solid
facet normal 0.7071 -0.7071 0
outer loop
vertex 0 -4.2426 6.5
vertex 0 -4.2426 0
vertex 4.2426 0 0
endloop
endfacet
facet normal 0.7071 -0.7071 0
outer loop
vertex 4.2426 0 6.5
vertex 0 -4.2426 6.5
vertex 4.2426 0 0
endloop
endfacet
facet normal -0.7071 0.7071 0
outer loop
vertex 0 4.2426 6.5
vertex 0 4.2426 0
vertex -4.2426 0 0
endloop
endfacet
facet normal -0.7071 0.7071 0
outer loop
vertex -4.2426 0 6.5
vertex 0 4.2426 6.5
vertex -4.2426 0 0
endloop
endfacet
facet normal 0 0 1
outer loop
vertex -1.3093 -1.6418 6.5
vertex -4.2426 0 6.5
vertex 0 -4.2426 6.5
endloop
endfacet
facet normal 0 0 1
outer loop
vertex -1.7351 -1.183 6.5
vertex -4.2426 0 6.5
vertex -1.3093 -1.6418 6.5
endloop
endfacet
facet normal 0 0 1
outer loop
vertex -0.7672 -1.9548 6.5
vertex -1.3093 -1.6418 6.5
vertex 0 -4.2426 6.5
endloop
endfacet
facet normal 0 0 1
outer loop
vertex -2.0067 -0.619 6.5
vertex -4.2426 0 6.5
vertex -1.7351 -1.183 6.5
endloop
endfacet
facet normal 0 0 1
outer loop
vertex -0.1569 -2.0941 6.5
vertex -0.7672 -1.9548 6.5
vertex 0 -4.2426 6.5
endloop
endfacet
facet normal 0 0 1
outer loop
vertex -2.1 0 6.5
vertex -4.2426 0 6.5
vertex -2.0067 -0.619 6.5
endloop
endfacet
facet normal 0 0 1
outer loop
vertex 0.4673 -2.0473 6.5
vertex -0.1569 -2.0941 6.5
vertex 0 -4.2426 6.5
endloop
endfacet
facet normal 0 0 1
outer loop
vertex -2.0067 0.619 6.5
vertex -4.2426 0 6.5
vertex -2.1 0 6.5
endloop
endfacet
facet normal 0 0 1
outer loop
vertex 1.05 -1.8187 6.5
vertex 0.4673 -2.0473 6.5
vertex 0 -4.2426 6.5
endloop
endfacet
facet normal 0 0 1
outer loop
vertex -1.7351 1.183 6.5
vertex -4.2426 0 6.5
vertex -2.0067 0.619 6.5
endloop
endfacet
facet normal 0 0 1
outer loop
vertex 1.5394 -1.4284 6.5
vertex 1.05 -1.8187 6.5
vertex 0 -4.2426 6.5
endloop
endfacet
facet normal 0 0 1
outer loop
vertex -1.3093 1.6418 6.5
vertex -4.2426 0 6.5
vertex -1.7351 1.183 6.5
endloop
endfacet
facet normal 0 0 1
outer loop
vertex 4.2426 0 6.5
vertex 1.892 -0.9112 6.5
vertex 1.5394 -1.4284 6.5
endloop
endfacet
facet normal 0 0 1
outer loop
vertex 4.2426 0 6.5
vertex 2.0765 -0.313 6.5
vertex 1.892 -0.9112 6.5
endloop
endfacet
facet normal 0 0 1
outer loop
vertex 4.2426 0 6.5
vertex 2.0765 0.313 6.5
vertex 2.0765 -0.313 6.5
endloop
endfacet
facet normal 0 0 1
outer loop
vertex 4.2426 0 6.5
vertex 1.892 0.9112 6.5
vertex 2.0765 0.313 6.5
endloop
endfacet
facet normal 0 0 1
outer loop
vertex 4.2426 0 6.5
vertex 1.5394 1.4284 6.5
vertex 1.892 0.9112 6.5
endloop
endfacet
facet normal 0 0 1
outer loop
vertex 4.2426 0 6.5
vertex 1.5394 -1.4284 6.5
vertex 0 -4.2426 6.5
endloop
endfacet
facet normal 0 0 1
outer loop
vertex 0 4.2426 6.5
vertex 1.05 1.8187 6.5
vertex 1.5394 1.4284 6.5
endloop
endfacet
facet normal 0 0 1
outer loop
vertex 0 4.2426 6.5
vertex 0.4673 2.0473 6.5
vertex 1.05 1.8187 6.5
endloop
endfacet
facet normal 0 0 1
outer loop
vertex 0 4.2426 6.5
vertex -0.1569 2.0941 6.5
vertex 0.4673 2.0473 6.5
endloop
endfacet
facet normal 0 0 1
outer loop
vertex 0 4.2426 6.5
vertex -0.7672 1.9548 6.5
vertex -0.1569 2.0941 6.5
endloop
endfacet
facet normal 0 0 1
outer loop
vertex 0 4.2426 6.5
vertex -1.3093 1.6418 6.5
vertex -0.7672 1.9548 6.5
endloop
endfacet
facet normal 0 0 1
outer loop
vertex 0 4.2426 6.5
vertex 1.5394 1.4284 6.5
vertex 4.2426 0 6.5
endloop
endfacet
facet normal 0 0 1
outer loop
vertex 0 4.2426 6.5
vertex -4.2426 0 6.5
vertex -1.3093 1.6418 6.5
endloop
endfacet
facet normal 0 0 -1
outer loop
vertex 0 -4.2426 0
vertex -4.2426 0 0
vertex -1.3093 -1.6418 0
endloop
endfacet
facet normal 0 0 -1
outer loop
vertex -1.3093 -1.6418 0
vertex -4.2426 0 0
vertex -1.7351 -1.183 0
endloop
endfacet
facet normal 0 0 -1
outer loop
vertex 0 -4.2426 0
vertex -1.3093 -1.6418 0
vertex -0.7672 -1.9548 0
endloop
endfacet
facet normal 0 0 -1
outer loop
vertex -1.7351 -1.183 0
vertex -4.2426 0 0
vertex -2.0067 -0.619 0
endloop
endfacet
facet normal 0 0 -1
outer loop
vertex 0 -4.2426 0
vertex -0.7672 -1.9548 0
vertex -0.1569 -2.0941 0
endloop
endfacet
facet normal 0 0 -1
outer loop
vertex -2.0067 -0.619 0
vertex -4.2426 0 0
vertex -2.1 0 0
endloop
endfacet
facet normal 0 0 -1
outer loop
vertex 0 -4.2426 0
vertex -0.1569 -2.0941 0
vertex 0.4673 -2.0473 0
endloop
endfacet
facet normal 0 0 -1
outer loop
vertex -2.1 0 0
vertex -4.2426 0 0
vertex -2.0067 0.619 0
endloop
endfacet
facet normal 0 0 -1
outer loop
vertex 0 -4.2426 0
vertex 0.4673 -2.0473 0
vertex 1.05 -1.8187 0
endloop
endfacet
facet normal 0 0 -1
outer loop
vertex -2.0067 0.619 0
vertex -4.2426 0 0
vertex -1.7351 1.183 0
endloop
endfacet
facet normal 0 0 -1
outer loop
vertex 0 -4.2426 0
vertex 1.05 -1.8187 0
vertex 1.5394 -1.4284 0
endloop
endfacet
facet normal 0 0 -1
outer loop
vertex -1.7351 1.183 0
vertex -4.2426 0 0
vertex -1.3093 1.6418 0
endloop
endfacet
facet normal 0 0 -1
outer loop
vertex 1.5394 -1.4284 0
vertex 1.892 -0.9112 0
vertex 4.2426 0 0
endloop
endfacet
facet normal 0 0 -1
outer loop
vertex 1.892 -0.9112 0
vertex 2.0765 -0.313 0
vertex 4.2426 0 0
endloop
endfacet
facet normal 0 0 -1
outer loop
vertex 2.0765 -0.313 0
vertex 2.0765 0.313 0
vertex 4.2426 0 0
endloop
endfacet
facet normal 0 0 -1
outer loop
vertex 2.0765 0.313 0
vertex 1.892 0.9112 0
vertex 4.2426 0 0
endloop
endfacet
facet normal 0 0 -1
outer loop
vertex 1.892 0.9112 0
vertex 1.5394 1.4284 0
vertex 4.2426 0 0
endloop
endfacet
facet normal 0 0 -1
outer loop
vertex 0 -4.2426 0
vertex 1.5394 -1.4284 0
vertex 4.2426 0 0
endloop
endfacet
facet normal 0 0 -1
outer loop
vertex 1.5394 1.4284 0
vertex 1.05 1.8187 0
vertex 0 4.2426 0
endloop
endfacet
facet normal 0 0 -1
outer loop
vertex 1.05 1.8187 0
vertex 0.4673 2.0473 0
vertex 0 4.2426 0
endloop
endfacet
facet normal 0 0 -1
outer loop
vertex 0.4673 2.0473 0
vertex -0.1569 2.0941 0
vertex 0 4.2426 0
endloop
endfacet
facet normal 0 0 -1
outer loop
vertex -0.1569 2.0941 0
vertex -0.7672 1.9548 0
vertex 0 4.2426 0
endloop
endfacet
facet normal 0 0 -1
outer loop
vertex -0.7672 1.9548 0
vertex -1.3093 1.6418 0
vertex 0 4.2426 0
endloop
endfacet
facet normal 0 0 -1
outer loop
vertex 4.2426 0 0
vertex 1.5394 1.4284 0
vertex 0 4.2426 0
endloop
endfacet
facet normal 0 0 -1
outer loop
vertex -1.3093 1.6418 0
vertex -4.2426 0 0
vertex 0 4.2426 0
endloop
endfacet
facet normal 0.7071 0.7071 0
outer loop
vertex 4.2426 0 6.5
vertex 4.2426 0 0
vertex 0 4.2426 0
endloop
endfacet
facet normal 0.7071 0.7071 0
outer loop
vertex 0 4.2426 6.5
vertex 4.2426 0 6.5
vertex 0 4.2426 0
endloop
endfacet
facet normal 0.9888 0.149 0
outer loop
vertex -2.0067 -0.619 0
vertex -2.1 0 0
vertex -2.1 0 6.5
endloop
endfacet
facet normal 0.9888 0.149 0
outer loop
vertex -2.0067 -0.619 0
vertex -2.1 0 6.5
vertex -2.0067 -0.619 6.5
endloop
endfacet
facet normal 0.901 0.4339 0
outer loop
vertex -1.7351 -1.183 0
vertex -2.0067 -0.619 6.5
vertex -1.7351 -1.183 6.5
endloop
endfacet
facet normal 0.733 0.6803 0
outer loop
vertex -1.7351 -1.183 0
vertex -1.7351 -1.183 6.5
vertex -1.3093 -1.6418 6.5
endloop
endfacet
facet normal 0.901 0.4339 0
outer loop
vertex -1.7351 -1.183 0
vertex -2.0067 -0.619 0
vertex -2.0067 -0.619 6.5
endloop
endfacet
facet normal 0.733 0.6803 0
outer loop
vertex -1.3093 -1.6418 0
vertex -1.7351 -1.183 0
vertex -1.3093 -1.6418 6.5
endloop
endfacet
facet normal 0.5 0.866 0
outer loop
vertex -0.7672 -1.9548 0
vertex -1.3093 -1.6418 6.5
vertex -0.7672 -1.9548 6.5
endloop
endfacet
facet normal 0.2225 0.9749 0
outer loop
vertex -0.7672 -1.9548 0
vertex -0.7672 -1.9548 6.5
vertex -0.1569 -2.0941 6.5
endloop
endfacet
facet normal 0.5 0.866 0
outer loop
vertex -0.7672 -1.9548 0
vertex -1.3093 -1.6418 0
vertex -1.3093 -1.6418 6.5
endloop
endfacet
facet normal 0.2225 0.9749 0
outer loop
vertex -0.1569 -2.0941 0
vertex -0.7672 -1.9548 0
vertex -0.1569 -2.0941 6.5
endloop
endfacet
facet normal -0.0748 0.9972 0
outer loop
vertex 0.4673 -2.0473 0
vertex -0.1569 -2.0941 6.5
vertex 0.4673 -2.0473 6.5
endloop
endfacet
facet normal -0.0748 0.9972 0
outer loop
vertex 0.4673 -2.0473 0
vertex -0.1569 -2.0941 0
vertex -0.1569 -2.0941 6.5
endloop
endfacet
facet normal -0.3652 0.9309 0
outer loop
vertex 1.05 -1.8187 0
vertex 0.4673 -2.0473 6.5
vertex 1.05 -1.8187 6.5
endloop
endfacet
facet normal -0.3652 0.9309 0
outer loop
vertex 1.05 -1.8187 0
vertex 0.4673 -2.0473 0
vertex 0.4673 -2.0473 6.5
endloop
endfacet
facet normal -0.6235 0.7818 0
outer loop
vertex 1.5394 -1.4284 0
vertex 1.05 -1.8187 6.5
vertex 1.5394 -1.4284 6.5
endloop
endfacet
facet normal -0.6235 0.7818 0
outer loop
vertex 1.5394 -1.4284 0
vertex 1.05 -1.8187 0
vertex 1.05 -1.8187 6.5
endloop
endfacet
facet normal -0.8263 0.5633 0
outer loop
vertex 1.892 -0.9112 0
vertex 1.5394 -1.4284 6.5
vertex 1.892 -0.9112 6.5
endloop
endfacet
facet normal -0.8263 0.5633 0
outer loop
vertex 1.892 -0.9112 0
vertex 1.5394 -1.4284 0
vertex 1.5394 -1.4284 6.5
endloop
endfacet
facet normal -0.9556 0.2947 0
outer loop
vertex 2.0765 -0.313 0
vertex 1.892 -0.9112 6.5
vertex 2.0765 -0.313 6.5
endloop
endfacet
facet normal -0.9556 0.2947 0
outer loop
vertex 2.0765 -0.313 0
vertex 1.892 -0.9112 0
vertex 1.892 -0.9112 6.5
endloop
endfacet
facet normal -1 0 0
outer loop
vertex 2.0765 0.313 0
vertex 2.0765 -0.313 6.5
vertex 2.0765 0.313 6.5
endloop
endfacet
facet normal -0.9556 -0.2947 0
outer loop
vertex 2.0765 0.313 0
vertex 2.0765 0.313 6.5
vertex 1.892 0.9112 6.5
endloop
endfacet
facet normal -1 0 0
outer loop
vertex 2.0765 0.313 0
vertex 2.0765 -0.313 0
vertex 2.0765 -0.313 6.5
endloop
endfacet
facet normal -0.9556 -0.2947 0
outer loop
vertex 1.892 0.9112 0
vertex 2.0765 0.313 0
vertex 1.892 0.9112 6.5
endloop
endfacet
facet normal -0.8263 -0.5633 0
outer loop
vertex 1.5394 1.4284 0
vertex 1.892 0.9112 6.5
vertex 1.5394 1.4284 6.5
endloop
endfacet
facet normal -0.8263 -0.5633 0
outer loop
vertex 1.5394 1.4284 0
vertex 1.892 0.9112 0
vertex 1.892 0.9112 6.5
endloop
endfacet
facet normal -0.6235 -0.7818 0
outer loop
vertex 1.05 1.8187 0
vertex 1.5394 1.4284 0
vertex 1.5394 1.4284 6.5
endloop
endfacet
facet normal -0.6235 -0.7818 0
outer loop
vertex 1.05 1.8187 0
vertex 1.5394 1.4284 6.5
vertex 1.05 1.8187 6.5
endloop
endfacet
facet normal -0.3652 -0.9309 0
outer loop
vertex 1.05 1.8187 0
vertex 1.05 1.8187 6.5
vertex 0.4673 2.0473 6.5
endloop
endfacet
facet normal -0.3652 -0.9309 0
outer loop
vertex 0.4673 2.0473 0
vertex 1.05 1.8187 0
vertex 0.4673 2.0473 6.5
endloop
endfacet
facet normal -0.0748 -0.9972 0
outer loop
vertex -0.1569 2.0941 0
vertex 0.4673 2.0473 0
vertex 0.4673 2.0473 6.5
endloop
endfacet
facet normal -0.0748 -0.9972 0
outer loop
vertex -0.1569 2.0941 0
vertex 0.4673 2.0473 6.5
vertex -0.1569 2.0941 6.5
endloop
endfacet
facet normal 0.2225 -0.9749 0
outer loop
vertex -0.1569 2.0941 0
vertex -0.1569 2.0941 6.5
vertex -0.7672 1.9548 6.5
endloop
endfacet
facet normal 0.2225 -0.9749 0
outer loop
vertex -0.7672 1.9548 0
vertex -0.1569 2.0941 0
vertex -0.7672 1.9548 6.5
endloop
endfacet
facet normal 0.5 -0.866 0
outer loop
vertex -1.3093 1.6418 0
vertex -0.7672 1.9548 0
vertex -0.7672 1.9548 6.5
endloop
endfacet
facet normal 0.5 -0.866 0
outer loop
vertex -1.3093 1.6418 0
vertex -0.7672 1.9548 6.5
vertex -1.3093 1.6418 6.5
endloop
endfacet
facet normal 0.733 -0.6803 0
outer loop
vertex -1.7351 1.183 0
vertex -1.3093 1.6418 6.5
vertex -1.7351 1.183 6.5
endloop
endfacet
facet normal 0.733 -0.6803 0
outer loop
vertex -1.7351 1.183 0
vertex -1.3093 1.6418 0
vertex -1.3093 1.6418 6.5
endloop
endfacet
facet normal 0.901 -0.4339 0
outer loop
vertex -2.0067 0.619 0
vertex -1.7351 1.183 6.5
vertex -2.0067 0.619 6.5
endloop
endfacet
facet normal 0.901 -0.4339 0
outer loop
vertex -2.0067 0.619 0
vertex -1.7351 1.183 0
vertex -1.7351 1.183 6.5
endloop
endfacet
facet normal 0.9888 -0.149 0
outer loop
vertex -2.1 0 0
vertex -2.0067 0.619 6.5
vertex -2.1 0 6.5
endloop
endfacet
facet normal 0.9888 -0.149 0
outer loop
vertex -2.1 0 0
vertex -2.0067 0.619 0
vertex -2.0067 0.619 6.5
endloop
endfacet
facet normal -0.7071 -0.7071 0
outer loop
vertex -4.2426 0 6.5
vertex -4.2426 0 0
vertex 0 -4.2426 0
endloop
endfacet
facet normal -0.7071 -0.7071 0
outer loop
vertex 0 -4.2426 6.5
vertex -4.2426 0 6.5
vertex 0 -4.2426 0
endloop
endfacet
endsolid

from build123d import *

# Parameters (mm, degrees)
SKETCH_1_R      = 2.1
EXTRUDE_1_DEPTH = 6.5


with BuildPart() as part:
    # ｽｹｯﾁ1 → ﾎﾞｽ - 押し出し1 (new body)
    with BuildSketch(Plane.XY):
        Polygon((4.242640687, 0), (0, 4.242640687), (-4.242640687, 0), (0, -4.242640687), align=None)
        with Locations(Location((0, 0, 0), (0, 0, 180))):
            Circle(SKETCH_1_R, mode=Mode.SUBTRACT)
    extrude(amount=EXTRUDE_1_DEPTH)


solid = part.part
